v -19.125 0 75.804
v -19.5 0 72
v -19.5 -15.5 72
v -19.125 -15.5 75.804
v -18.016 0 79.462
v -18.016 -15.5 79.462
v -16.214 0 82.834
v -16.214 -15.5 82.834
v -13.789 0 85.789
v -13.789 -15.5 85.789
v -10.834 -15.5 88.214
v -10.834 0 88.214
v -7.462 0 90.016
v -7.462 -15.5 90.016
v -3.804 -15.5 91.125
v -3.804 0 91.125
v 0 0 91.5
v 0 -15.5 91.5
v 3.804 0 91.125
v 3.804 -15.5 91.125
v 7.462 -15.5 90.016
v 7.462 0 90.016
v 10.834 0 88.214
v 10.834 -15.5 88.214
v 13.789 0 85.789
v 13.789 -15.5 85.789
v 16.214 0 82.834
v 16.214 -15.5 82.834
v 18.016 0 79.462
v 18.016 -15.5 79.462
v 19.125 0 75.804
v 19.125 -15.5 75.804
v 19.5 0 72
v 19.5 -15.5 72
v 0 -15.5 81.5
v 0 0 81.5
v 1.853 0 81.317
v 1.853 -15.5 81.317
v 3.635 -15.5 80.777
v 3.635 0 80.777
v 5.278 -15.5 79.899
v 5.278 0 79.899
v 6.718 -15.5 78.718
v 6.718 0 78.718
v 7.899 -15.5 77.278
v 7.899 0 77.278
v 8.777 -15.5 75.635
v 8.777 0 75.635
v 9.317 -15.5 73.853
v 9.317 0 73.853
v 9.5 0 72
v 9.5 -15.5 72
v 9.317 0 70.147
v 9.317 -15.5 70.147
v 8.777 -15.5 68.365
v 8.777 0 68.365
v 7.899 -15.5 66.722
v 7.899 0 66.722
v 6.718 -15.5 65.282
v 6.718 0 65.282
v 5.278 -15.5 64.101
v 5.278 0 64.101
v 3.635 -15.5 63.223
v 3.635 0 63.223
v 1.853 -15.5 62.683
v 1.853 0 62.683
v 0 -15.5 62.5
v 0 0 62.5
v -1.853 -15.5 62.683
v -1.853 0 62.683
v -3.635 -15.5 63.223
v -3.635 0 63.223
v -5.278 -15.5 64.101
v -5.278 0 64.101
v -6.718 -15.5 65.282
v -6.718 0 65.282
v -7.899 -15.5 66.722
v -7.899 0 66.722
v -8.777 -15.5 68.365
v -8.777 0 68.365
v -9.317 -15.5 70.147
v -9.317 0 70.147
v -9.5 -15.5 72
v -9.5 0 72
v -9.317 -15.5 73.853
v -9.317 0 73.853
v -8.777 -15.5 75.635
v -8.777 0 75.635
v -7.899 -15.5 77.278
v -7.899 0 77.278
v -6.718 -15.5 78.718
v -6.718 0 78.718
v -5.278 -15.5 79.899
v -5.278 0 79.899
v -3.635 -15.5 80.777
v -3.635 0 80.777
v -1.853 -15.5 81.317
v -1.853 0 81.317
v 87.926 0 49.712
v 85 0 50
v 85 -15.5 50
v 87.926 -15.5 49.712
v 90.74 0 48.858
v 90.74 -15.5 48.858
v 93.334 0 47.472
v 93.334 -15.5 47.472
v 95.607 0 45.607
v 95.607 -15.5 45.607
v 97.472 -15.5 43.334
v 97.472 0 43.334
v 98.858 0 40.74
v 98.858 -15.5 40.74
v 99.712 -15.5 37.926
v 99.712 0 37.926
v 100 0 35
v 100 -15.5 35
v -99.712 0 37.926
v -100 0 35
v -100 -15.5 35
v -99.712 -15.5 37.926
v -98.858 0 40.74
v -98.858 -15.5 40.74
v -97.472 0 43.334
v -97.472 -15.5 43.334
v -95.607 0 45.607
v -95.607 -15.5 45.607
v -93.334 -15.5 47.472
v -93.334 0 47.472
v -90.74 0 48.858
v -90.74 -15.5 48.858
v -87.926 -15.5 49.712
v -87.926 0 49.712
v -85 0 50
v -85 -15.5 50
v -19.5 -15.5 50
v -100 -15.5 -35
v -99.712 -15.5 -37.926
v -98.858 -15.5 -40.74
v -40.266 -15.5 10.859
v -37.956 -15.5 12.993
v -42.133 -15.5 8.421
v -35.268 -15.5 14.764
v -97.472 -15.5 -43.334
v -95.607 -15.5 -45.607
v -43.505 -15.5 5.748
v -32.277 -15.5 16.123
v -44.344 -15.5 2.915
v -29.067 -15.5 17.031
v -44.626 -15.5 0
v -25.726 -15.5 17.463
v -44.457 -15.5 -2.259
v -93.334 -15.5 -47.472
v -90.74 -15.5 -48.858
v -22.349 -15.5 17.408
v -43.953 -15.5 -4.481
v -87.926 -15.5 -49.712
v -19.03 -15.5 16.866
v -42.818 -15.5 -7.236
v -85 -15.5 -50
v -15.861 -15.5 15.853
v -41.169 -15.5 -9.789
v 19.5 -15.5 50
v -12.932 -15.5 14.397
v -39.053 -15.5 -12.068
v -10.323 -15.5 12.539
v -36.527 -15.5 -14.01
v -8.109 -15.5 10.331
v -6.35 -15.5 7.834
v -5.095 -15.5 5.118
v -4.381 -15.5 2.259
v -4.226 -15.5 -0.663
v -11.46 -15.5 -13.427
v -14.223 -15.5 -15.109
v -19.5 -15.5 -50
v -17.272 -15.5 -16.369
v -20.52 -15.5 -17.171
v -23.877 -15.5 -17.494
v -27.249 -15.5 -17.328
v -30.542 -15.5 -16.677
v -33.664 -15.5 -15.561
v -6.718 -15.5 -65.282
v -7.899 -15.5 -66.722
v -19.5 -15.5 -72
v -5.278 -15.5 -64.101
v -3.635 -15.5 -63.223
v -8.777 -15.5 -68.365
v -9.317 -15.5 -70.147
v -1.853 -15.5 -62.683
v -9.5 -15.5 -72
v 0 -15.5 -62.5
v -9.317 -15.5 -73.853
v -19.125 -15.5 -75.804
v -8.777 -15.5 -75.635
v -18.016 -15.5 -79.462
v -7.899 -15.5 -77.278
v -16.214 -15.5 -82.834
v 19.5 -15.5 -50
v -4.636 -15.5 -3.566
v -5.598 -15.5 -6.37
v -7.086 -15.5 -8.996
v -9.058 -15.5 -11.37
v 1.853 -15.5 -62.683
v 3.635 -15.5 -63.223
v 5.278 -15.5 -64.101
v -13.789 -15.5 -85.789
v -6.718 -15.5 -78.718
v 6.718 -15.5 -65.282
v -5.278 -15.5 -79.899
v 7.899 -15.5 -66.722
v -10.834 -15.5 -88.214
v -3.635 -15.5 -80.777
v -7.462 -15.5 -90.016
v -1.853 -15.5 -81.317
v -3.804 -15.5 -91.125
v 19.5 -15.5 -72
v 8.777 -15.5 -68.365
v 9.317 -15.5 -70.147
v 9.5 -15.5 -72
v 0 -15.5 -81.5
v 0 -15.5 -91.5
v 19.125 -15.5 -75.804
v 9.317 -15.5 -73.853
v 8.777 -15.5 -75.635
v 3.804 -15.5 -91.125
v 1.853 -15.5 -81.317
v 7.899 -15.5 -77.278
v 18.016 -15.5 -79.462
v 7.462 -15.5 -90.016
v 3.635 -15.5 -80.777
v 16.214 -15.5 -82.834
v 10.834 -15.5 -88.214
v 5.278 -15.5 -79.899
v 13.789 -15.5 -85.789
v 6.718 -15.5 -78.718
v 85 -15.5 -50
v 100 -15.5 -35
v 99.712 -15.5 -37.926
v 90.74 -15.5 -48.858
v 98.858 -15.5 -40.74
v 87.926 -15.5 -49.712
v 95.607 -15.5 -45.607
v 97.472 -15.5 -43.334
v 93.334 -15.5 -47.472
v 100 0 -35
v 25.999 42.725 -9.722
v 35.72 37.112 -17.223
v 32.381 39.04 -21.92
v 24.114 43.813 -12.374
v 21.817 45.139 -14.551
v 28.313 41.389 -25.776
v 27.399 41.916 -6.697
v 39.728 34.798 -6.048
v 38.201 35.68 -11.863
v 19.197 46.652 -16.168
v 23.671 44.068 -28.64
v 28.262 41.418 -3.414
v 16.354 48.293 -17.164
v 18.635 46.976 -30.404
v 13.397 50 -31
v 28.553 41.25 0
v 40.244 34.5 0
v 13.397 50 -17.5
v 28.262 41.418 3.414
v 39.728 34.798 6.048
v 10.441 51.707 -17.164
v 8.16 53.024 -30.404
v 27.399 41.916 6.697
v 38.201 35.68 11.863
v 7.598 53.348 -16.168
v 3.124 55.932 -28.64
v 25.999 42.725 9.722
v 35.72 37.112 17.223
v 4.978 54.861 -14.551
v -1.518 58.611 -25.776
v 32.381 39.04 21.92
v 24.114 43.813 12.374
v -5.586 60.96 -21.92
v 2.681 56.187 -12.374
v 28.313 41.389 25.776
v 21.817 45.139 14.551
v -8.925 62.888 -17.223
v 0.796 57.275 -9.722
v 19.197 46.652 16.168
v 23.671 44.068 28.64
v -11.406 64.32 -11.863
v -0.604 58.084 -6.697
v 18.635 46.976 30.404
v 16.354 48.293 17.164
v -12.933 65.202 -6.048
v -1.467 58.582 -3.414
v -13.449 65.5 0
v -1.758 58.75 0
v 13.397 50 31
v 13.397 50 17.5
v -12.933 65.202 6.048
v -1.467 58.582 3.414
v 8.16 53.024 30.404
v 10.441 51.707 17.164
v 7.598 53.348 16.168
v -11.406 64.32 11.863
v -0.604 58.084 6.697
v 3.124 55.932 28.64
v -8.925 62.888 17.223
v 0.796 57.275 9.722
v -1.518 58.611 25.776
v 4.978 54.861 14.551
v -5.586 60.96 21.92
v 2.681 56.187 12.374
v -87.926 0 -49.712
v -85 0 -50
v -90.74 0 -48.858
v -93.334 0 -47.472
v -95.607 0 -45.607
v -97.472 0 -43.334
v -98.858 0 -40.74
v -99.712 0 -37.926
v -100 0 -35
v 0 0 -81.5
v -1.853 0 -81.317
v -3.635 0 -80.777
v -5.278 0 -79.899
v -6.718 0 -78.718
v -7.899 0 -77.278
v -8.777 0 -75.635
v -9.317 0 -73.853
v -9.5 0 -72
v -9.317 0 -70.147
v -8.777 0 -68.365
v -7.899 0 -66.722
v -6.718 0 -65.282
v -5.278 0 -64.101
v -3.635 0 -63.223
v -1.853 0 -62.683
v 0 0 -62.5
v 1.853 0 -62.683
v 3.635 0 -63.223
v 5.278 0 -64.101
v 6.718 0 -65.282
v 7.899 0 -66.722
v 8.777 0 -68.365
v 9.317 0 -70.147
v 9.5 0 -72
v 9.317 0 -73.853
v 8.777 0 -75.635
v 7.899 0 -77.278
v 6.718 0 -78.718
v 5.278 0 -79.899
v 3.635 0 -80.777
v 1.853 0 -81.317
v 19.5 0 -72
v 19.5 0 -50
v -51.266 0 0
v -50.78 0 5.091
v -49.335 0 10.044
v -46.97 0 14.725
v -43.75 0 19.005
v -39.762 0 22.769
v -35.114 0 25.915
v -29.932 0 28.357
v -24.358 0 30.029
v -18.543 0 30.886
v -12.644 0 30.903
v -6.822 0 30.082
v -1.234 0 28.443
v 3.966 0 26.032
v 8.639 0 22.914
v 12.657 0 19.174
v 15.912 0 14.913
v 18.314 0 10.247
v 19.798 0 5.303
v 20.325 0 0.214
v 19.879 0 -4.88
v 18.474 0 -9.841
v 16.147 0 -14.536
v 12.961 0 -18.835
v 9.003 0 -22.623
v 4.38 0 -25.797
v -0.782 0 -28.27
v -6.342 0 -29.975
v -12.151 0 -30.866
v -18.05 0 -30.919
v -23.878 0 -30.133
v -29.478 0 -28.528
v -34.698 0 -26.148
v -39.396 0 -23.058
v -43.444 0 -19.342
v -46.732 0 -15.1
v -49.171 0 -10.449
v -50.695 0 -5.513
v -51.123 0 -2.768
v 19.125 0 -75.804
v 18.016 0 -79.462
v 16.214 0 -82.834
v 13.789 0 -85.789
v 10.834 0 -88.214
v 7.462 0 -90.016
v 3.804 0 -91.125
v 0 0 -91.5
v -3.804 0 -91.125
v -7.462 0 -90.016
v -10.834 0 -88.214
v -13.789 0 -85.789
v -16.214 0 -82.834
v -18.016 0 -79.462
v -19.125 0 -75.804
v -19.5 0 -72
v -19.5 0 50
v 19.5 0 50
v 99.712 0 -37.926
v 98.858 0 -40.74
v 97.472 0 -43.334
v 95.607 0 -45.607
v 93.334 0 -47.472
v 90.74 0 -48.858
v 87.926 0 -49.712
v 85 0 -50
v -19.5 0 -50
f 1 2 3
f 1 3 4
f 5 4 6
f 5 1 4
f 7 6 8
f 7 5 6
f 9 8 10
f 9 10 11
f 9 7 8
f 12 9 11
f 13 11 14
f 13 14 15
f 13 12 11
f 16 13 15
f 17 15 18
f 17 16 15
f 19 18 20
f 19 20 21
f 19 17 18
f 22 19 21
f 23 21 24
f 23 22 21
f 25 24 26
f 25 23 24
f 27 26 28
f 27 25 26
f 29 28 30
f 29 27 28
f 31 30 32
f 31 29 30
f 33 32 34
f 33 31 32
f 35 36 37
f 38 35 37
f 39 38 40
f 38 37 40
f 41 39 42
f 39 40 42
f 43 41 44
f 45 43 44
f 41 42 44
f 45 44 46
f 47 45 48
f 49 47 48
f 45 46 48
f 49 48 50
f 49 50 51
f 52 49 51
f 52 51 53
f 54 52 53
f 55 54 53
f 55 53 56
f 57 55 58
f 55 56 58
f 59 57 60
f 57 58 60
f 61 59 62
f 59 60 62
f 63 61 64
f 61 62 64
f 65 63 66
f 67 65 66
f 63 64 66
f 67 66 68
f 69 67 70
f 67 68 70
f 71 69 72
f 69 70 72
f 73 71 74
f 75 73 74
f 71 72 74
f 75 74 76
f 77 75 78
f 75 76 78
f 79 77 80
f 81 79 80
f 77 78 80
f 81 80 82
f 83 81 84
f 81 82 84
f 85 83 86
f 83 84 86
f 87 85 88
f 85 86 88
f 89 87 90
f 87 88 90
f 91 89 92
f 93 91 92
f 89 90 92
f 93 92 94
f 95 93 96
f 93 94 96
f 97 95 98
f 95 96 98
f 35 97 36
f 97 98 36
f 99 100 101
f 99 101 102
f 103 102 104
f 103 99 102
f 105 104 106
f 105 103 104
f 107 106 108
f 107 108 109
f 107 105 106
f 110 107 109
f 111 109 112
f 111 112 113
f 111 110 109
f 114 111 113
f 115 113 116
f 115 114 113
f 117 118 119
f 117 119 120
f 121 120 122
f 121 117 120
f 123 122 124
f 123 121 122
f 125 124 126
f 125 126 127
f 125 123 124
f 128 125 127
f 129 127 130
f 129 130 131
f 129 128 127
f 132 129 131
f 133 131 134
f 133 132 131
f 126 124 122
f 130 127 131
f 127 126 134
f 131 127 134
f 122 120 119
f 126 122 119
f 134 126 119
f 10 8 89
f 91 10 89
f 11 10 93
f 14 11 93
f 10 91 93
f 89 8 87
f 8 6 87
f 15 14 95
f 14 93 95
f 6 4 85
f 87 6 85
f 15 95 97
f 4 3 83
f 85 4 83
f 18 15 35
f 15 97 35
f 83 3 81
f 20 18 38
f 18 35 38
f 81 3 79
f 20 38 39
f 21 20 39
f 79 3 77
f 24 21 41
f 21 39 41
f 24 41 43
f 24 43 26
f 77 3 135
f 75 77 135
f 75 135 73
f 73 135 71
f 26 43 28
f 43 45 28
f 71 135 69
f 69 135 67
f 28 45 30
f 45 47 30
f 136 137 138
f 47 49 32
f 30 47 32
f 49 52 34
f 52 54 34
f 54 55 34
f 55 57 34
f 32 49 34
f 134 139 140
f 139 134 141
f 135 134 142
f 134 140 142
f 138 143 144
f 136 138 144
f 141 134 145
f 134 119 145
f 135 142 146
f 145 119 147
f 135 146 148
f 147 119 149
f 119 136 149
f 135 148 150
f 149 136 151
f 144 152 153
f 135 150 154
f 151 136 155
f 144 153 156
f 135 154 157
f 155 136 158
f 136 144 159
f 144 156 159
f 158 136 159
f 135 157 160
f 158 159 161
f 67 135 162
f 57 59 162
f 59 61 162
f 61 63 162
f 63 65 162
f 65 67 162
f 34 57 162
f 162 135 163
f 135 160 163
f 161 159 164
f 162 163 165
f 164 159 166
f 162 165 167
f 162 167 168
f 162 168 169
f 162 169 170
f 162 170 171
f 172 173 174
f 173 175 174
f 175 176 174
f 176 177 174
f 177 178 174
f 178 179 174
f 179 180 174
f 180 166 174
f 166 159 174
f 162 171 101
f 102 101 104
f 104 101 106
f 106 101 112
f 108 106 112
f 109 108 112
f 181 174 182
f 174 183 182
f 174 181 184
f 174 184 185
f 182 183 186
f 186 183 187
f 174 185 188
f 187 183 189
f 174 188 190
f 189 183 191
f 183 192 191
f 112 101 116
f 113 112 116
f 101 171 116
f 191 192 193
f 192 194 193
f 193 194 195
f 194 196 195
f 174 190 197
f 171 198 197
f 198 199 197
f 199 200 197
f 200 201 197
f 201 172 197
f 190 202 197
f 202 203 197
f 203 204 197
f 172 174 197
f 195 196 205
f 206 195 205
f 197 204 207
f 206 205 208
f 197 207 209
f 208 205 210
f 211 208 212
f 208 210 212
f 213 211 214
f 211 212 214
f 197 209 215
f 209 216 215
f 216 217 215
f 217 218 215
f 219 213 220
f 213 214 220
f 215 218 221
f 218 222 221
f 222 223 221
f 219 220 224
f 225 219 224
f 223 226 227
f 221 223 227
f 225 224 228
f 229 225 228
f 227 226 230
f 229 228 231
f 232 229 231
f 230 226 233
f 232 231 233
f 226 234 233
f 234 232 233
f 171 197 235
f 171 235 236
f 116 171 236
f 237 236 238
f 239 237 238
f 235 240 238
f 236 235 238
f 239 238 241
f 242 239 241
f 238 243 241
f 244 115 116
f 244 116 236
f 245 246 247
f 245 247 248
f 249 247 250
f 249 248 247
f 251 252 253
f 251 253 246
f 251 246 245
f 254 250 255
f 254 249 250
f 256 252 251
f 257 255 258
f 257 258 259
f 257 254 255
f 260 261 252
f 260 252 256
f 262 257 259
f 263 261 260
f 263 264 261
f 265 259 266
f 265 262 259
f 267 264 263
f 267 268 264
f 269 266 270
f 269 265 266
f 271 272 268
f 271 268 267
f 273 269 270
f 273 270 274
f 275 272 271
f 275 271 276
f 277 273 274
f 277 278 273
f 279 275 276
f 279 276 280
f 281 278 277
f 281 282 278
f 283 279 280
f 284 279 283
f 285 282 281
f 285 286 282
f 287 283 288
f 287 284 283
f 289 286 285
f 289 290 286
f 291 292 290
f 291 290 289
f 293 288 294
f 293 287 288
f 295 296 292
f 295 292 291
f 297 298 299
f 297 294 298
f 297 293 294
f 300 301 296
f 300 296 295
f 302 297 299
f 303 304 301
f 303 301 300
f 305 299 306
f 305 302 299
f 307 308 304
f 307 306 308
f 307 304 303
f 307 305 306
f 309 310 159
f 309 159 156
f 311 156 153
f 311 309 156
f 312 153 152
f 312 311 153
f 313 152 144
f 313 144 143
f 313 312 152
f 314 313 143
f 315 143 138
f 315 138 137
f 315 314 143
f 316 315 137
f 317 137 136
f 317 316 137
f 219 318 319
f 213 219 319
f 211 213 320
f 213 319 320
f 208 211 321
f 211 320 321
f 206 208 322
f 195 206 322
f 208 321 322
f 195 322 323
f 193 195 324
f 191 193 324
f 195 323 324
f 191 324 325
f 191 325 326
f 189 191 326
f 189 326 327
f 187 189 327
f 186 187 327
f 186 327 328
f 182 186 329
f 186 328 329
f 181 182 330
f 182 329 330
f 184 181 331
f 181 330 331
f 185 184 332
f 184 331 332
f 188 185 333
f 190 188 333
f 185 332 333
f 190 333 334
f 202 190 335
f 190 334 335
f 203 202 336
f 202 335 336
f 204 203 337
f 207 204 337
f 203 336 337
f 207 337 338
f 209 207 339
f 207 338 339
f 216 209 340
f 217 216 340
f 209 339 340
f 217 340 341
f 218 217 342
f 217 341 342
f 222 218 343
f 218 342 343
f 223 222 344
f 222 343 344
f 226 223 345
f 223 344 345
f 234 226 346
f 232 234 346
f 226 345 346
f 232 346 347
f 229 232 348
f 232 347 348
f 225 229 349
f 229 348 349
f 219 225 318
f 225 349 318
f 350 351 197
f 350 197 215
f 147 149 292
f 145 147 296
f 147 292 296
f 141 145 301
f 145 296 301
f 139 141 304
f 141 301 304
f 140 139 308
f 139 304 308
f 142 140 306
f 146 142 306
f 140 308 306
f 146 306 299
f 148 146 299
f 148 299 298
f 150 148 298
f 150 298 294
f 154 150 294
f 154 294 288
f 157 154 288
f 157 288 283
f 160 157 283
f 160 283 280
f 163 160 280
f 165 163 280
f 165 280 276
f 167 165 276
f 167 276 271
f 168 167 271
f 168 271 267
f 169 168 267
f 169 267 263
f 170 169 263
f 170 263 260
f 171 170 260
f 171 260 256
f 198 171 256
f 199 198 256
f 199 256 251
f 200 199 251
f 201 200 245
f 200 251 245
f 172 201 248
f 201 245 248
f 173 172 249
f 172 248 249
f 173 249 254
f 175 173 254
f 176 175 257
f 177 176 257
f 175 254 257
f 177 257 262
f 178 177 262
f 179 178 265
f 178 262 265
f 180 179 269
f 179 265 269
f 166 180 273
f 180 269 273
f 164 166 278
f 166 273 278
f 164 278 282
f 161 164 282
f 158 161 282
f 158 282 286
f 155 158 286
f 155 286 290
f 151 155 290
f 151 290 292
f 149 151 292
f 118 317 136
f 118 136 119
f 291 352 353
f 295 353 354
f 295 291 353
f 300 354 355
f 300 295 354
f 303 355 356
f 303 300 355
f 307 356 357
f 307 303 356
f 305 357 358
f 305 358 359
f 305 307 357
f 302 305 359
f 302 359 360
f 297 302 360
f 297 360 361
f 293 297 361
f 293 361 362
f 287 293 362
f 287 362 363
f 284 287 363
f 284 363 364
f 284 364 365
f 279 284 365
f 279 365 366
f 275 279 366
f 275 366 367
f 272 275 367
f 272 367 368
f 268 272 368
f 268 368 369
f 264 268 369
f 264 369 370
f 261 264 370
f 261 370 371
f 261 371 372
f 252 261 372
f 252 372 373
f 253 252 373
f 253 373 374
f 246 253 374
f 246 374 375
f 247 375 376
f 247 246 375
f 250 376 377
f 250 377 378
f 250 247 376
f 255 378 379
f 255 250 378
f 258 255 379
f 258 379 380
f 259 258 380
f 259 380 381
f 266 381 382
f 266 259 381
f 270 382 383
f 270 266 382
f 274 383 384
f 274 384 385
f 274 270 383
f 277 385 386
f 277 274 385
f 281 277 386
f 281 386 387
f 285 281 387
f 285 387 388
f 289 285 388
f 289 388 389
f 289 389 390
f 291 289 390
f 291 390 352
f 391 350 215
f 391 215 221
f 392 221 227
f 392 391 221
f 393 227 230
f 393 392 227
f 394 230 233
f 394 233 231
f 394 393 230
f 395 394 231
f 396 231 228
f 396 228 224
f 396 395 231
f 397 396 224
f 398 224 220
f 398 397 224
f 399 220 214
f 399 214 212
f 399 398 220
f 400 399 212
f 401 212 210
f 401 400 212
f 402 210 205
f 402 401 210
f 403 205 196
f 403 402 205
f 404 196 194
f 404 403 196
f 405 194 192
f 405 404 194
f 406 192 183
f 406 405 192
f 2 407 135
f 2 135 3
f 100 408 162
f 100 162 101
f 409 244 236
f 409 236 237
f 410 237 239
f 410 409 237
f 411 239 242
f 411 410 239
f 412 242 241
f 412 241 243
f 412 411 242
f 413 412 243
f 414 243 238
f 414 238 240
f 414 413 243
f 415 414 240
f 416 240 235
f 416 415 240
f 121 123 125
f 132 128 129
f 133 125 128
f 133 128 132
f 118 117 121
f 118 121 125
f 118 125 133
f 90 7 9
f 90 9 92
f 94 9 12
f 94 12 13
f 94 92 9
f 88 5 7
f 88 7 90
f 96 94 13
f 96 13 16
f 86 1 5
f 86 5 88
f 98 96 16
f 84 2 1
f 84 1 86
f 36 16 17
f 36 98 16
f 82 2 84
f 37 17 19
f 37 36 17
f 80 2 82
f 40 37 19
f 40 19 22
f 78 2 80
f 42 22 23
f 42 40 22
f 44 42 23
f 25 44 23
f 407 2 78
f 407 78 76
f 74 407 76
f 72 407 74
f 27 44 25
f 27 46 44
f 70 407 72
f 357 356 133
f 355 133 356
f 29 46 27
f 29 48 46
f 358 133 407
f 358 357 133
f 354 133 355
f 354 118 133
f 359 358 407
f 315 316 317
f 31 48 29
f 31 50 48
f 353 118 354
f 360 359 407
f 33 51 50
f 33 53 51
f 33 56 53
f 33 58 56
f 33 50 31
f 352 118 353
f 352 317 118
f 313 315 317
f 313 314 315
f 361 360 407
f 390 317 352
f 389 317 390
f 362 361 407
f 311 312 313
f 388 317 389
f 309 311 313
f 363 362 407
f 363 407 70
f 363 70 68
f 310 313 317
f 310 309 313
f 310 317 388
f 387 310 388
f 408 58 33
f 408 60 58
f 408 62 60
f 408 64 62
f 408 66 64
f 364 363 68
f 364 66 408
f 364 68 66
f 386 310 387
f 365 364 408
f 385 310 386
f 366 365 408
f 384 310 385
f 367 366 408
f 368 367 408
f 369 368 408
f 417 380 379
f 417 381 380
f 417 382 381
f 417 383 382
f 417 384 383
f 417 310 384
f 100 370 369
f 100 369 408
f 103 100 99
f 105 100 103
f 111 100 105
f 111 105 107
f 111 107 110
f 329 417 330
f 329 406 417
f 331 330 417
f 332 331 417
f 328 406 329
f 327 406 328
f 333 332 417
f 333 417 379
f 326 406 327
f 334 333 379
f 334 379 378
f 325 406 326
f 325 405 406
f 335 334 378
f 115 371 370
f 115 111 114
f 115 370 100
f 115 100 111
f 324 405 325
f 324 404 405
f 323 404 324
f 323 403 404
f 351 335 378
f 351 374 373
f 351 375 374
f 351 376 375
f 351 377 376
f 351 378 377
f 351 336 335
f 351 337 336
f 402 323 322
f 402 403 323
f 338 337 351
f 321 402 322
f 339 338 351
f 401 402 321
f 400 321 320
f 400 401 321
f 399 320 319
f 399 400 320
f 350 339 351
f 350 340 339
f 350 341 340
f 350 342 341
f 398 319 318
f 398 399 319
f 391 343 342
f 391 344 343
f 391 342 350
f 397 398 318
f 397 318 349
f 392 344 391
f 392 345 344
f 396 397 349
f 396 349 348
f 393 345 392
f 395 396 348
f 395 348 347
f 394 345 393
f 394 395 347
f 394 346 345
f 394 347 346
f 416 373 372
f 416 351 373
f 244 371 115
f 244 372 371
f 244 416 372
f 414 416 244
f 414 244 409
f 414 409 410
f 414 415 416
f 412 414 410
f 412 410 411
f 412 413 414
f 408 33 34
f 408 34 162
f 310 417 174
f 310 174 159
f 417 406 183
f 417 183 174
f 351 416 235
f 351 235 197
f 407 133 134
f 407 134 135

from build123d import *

# Parameters (mm, degrees)
SKETCH1_R           = 9.5
BOSS_EXTRUDE1_DEPTH = 15.5
BOSS_EXTRUDE2_REACH = 167.695
SKETCH2_R           = 31
CUT_EXTRUDE1_REACH  = 167.695
SKETCH3_R           = 17.5


with BuildPart() as part:
    # Sketch1 → Boss-Extrude1 (new body)
    with BuildSketch(Plane(origin=(0, 0, 0), x_dir=(1, 0, 0), z_dir=(0, 1, 0))):
        with BuildLine():
            Line((-85, -50), (-19.5, -50))
            Line((-19.5, -50), (-19.5, -72))
            ThreePointArc((-19.5, -72), (0, -91.5), (19.5, -72))
            Line((19.5, -72), (19.5, -50))
            Line((19.5, -50), (85, -50))
            ThreePointArc((85, -50), (95.606601718, -45.606601718), (100, -35))
            Line((100, -35), (100, 35))
            ThreePointArc((100, 35), (95.606601718, 45.606601718), (85, 50))
            Line((85, 50), (19.5, 50))
            Line((19.5, 50), (19.5, 72))
            ThreePointArc((19.5, 72), (0, 91.5), (-19.5, 72))
            Line((-19.5, 72), (-19.5, 50))
            Line((-19.5, 50), (-85, 50))
            ThreePointArc((-85, 50), (-95.606601718, 45.606601718), (-100, 35))
            Line((-100, 35), (-100, -35))
            ThreePointArc((-100, -35), (-95.606601718, -45.606601718), (-85, -50))
        make_face()
        with Locations(Location((0, -72, 0), (0, 0, 270))):
            Circle(SKETCH1_R, mode=Mode.SUBTRACT)
        with Locations(Location((0, 72, 0), (0, 0, 90))):
            Circle(SKETCH1_R, mode=Mode.SUBTRACT)
    extrude(amount=-BOSS_EXTRUDE1_DEPTH)

    # Boss-Extrude2: up to this plane
    boss_extrude2_end = Plane(origin=(0, 0, 72), z_dir=(0, 1, 0))
    # Sketch2 → Boss-Extrude2 (add, up to the surface)
    with BuildSketch(Plane(origin=(25, 43.301270189, 0), x_dir=(0, 0, -1), z_dir=(0.500000000000001, 0.866025403784438, 0)), mode=Mode.PRIVATE) as boss_extrude2_sk1:
        with Locations(Location((0, 13.397459622, 0), (0, 0, 90))):
            Circle(SKETCH2_R)
    boss_extrude2_tool1 = split(extrude(boss_extrude2_sk1.sketch, amount=-BOSS_EXTRUDE2_REACH, mode=Mode.PRIVATE), bisect_by=boss_extrude2_end, keep=Keep.BOTH, mode=Mode.PRIVATE)
    add(boss_extrude2_tool1.solids().sort_by_distance((13.39746, 50, 0))[0])

    # Cut-Extrude1: up to this plane
    cut_extrude1_end = Plane(origin=(0, -15.5, 72), z_dir=(0, 1, 0))
    # Sketch3 → Cut-Extrude1 (cut, up to the surface)
    with BuildSketch(Plane(origin=(25, 43.301270189, 0), x_dir=(0.8660254037844382, -0.500000000000001, 0), z_dir=(0.500000000000001, 0.8660254037844382, 0)), mode=Mode.PRIVATE) as cut_extrude1_sk1:
        with Locations(Location((-13.397459622, 0, 0), (0, 0, 180))):
            Circle(SKETCH3_R)
    cut_extrude1_tool1 = split(extrude(cut_extrude1_sk1.sketch, amount=-CUT_EXTRUDE1_REACH, mode=Mode.PRIVATE), bisect_by=cut_extrude1_end, keep=Keep.BOTH, mode=Mode.PRIVATE)
    add(cut_extrude1_tool1.solids().sort_by_distance((13.39746, 50, 0))[0], mode=Mode.SUBTRACT)


solid = part.part
